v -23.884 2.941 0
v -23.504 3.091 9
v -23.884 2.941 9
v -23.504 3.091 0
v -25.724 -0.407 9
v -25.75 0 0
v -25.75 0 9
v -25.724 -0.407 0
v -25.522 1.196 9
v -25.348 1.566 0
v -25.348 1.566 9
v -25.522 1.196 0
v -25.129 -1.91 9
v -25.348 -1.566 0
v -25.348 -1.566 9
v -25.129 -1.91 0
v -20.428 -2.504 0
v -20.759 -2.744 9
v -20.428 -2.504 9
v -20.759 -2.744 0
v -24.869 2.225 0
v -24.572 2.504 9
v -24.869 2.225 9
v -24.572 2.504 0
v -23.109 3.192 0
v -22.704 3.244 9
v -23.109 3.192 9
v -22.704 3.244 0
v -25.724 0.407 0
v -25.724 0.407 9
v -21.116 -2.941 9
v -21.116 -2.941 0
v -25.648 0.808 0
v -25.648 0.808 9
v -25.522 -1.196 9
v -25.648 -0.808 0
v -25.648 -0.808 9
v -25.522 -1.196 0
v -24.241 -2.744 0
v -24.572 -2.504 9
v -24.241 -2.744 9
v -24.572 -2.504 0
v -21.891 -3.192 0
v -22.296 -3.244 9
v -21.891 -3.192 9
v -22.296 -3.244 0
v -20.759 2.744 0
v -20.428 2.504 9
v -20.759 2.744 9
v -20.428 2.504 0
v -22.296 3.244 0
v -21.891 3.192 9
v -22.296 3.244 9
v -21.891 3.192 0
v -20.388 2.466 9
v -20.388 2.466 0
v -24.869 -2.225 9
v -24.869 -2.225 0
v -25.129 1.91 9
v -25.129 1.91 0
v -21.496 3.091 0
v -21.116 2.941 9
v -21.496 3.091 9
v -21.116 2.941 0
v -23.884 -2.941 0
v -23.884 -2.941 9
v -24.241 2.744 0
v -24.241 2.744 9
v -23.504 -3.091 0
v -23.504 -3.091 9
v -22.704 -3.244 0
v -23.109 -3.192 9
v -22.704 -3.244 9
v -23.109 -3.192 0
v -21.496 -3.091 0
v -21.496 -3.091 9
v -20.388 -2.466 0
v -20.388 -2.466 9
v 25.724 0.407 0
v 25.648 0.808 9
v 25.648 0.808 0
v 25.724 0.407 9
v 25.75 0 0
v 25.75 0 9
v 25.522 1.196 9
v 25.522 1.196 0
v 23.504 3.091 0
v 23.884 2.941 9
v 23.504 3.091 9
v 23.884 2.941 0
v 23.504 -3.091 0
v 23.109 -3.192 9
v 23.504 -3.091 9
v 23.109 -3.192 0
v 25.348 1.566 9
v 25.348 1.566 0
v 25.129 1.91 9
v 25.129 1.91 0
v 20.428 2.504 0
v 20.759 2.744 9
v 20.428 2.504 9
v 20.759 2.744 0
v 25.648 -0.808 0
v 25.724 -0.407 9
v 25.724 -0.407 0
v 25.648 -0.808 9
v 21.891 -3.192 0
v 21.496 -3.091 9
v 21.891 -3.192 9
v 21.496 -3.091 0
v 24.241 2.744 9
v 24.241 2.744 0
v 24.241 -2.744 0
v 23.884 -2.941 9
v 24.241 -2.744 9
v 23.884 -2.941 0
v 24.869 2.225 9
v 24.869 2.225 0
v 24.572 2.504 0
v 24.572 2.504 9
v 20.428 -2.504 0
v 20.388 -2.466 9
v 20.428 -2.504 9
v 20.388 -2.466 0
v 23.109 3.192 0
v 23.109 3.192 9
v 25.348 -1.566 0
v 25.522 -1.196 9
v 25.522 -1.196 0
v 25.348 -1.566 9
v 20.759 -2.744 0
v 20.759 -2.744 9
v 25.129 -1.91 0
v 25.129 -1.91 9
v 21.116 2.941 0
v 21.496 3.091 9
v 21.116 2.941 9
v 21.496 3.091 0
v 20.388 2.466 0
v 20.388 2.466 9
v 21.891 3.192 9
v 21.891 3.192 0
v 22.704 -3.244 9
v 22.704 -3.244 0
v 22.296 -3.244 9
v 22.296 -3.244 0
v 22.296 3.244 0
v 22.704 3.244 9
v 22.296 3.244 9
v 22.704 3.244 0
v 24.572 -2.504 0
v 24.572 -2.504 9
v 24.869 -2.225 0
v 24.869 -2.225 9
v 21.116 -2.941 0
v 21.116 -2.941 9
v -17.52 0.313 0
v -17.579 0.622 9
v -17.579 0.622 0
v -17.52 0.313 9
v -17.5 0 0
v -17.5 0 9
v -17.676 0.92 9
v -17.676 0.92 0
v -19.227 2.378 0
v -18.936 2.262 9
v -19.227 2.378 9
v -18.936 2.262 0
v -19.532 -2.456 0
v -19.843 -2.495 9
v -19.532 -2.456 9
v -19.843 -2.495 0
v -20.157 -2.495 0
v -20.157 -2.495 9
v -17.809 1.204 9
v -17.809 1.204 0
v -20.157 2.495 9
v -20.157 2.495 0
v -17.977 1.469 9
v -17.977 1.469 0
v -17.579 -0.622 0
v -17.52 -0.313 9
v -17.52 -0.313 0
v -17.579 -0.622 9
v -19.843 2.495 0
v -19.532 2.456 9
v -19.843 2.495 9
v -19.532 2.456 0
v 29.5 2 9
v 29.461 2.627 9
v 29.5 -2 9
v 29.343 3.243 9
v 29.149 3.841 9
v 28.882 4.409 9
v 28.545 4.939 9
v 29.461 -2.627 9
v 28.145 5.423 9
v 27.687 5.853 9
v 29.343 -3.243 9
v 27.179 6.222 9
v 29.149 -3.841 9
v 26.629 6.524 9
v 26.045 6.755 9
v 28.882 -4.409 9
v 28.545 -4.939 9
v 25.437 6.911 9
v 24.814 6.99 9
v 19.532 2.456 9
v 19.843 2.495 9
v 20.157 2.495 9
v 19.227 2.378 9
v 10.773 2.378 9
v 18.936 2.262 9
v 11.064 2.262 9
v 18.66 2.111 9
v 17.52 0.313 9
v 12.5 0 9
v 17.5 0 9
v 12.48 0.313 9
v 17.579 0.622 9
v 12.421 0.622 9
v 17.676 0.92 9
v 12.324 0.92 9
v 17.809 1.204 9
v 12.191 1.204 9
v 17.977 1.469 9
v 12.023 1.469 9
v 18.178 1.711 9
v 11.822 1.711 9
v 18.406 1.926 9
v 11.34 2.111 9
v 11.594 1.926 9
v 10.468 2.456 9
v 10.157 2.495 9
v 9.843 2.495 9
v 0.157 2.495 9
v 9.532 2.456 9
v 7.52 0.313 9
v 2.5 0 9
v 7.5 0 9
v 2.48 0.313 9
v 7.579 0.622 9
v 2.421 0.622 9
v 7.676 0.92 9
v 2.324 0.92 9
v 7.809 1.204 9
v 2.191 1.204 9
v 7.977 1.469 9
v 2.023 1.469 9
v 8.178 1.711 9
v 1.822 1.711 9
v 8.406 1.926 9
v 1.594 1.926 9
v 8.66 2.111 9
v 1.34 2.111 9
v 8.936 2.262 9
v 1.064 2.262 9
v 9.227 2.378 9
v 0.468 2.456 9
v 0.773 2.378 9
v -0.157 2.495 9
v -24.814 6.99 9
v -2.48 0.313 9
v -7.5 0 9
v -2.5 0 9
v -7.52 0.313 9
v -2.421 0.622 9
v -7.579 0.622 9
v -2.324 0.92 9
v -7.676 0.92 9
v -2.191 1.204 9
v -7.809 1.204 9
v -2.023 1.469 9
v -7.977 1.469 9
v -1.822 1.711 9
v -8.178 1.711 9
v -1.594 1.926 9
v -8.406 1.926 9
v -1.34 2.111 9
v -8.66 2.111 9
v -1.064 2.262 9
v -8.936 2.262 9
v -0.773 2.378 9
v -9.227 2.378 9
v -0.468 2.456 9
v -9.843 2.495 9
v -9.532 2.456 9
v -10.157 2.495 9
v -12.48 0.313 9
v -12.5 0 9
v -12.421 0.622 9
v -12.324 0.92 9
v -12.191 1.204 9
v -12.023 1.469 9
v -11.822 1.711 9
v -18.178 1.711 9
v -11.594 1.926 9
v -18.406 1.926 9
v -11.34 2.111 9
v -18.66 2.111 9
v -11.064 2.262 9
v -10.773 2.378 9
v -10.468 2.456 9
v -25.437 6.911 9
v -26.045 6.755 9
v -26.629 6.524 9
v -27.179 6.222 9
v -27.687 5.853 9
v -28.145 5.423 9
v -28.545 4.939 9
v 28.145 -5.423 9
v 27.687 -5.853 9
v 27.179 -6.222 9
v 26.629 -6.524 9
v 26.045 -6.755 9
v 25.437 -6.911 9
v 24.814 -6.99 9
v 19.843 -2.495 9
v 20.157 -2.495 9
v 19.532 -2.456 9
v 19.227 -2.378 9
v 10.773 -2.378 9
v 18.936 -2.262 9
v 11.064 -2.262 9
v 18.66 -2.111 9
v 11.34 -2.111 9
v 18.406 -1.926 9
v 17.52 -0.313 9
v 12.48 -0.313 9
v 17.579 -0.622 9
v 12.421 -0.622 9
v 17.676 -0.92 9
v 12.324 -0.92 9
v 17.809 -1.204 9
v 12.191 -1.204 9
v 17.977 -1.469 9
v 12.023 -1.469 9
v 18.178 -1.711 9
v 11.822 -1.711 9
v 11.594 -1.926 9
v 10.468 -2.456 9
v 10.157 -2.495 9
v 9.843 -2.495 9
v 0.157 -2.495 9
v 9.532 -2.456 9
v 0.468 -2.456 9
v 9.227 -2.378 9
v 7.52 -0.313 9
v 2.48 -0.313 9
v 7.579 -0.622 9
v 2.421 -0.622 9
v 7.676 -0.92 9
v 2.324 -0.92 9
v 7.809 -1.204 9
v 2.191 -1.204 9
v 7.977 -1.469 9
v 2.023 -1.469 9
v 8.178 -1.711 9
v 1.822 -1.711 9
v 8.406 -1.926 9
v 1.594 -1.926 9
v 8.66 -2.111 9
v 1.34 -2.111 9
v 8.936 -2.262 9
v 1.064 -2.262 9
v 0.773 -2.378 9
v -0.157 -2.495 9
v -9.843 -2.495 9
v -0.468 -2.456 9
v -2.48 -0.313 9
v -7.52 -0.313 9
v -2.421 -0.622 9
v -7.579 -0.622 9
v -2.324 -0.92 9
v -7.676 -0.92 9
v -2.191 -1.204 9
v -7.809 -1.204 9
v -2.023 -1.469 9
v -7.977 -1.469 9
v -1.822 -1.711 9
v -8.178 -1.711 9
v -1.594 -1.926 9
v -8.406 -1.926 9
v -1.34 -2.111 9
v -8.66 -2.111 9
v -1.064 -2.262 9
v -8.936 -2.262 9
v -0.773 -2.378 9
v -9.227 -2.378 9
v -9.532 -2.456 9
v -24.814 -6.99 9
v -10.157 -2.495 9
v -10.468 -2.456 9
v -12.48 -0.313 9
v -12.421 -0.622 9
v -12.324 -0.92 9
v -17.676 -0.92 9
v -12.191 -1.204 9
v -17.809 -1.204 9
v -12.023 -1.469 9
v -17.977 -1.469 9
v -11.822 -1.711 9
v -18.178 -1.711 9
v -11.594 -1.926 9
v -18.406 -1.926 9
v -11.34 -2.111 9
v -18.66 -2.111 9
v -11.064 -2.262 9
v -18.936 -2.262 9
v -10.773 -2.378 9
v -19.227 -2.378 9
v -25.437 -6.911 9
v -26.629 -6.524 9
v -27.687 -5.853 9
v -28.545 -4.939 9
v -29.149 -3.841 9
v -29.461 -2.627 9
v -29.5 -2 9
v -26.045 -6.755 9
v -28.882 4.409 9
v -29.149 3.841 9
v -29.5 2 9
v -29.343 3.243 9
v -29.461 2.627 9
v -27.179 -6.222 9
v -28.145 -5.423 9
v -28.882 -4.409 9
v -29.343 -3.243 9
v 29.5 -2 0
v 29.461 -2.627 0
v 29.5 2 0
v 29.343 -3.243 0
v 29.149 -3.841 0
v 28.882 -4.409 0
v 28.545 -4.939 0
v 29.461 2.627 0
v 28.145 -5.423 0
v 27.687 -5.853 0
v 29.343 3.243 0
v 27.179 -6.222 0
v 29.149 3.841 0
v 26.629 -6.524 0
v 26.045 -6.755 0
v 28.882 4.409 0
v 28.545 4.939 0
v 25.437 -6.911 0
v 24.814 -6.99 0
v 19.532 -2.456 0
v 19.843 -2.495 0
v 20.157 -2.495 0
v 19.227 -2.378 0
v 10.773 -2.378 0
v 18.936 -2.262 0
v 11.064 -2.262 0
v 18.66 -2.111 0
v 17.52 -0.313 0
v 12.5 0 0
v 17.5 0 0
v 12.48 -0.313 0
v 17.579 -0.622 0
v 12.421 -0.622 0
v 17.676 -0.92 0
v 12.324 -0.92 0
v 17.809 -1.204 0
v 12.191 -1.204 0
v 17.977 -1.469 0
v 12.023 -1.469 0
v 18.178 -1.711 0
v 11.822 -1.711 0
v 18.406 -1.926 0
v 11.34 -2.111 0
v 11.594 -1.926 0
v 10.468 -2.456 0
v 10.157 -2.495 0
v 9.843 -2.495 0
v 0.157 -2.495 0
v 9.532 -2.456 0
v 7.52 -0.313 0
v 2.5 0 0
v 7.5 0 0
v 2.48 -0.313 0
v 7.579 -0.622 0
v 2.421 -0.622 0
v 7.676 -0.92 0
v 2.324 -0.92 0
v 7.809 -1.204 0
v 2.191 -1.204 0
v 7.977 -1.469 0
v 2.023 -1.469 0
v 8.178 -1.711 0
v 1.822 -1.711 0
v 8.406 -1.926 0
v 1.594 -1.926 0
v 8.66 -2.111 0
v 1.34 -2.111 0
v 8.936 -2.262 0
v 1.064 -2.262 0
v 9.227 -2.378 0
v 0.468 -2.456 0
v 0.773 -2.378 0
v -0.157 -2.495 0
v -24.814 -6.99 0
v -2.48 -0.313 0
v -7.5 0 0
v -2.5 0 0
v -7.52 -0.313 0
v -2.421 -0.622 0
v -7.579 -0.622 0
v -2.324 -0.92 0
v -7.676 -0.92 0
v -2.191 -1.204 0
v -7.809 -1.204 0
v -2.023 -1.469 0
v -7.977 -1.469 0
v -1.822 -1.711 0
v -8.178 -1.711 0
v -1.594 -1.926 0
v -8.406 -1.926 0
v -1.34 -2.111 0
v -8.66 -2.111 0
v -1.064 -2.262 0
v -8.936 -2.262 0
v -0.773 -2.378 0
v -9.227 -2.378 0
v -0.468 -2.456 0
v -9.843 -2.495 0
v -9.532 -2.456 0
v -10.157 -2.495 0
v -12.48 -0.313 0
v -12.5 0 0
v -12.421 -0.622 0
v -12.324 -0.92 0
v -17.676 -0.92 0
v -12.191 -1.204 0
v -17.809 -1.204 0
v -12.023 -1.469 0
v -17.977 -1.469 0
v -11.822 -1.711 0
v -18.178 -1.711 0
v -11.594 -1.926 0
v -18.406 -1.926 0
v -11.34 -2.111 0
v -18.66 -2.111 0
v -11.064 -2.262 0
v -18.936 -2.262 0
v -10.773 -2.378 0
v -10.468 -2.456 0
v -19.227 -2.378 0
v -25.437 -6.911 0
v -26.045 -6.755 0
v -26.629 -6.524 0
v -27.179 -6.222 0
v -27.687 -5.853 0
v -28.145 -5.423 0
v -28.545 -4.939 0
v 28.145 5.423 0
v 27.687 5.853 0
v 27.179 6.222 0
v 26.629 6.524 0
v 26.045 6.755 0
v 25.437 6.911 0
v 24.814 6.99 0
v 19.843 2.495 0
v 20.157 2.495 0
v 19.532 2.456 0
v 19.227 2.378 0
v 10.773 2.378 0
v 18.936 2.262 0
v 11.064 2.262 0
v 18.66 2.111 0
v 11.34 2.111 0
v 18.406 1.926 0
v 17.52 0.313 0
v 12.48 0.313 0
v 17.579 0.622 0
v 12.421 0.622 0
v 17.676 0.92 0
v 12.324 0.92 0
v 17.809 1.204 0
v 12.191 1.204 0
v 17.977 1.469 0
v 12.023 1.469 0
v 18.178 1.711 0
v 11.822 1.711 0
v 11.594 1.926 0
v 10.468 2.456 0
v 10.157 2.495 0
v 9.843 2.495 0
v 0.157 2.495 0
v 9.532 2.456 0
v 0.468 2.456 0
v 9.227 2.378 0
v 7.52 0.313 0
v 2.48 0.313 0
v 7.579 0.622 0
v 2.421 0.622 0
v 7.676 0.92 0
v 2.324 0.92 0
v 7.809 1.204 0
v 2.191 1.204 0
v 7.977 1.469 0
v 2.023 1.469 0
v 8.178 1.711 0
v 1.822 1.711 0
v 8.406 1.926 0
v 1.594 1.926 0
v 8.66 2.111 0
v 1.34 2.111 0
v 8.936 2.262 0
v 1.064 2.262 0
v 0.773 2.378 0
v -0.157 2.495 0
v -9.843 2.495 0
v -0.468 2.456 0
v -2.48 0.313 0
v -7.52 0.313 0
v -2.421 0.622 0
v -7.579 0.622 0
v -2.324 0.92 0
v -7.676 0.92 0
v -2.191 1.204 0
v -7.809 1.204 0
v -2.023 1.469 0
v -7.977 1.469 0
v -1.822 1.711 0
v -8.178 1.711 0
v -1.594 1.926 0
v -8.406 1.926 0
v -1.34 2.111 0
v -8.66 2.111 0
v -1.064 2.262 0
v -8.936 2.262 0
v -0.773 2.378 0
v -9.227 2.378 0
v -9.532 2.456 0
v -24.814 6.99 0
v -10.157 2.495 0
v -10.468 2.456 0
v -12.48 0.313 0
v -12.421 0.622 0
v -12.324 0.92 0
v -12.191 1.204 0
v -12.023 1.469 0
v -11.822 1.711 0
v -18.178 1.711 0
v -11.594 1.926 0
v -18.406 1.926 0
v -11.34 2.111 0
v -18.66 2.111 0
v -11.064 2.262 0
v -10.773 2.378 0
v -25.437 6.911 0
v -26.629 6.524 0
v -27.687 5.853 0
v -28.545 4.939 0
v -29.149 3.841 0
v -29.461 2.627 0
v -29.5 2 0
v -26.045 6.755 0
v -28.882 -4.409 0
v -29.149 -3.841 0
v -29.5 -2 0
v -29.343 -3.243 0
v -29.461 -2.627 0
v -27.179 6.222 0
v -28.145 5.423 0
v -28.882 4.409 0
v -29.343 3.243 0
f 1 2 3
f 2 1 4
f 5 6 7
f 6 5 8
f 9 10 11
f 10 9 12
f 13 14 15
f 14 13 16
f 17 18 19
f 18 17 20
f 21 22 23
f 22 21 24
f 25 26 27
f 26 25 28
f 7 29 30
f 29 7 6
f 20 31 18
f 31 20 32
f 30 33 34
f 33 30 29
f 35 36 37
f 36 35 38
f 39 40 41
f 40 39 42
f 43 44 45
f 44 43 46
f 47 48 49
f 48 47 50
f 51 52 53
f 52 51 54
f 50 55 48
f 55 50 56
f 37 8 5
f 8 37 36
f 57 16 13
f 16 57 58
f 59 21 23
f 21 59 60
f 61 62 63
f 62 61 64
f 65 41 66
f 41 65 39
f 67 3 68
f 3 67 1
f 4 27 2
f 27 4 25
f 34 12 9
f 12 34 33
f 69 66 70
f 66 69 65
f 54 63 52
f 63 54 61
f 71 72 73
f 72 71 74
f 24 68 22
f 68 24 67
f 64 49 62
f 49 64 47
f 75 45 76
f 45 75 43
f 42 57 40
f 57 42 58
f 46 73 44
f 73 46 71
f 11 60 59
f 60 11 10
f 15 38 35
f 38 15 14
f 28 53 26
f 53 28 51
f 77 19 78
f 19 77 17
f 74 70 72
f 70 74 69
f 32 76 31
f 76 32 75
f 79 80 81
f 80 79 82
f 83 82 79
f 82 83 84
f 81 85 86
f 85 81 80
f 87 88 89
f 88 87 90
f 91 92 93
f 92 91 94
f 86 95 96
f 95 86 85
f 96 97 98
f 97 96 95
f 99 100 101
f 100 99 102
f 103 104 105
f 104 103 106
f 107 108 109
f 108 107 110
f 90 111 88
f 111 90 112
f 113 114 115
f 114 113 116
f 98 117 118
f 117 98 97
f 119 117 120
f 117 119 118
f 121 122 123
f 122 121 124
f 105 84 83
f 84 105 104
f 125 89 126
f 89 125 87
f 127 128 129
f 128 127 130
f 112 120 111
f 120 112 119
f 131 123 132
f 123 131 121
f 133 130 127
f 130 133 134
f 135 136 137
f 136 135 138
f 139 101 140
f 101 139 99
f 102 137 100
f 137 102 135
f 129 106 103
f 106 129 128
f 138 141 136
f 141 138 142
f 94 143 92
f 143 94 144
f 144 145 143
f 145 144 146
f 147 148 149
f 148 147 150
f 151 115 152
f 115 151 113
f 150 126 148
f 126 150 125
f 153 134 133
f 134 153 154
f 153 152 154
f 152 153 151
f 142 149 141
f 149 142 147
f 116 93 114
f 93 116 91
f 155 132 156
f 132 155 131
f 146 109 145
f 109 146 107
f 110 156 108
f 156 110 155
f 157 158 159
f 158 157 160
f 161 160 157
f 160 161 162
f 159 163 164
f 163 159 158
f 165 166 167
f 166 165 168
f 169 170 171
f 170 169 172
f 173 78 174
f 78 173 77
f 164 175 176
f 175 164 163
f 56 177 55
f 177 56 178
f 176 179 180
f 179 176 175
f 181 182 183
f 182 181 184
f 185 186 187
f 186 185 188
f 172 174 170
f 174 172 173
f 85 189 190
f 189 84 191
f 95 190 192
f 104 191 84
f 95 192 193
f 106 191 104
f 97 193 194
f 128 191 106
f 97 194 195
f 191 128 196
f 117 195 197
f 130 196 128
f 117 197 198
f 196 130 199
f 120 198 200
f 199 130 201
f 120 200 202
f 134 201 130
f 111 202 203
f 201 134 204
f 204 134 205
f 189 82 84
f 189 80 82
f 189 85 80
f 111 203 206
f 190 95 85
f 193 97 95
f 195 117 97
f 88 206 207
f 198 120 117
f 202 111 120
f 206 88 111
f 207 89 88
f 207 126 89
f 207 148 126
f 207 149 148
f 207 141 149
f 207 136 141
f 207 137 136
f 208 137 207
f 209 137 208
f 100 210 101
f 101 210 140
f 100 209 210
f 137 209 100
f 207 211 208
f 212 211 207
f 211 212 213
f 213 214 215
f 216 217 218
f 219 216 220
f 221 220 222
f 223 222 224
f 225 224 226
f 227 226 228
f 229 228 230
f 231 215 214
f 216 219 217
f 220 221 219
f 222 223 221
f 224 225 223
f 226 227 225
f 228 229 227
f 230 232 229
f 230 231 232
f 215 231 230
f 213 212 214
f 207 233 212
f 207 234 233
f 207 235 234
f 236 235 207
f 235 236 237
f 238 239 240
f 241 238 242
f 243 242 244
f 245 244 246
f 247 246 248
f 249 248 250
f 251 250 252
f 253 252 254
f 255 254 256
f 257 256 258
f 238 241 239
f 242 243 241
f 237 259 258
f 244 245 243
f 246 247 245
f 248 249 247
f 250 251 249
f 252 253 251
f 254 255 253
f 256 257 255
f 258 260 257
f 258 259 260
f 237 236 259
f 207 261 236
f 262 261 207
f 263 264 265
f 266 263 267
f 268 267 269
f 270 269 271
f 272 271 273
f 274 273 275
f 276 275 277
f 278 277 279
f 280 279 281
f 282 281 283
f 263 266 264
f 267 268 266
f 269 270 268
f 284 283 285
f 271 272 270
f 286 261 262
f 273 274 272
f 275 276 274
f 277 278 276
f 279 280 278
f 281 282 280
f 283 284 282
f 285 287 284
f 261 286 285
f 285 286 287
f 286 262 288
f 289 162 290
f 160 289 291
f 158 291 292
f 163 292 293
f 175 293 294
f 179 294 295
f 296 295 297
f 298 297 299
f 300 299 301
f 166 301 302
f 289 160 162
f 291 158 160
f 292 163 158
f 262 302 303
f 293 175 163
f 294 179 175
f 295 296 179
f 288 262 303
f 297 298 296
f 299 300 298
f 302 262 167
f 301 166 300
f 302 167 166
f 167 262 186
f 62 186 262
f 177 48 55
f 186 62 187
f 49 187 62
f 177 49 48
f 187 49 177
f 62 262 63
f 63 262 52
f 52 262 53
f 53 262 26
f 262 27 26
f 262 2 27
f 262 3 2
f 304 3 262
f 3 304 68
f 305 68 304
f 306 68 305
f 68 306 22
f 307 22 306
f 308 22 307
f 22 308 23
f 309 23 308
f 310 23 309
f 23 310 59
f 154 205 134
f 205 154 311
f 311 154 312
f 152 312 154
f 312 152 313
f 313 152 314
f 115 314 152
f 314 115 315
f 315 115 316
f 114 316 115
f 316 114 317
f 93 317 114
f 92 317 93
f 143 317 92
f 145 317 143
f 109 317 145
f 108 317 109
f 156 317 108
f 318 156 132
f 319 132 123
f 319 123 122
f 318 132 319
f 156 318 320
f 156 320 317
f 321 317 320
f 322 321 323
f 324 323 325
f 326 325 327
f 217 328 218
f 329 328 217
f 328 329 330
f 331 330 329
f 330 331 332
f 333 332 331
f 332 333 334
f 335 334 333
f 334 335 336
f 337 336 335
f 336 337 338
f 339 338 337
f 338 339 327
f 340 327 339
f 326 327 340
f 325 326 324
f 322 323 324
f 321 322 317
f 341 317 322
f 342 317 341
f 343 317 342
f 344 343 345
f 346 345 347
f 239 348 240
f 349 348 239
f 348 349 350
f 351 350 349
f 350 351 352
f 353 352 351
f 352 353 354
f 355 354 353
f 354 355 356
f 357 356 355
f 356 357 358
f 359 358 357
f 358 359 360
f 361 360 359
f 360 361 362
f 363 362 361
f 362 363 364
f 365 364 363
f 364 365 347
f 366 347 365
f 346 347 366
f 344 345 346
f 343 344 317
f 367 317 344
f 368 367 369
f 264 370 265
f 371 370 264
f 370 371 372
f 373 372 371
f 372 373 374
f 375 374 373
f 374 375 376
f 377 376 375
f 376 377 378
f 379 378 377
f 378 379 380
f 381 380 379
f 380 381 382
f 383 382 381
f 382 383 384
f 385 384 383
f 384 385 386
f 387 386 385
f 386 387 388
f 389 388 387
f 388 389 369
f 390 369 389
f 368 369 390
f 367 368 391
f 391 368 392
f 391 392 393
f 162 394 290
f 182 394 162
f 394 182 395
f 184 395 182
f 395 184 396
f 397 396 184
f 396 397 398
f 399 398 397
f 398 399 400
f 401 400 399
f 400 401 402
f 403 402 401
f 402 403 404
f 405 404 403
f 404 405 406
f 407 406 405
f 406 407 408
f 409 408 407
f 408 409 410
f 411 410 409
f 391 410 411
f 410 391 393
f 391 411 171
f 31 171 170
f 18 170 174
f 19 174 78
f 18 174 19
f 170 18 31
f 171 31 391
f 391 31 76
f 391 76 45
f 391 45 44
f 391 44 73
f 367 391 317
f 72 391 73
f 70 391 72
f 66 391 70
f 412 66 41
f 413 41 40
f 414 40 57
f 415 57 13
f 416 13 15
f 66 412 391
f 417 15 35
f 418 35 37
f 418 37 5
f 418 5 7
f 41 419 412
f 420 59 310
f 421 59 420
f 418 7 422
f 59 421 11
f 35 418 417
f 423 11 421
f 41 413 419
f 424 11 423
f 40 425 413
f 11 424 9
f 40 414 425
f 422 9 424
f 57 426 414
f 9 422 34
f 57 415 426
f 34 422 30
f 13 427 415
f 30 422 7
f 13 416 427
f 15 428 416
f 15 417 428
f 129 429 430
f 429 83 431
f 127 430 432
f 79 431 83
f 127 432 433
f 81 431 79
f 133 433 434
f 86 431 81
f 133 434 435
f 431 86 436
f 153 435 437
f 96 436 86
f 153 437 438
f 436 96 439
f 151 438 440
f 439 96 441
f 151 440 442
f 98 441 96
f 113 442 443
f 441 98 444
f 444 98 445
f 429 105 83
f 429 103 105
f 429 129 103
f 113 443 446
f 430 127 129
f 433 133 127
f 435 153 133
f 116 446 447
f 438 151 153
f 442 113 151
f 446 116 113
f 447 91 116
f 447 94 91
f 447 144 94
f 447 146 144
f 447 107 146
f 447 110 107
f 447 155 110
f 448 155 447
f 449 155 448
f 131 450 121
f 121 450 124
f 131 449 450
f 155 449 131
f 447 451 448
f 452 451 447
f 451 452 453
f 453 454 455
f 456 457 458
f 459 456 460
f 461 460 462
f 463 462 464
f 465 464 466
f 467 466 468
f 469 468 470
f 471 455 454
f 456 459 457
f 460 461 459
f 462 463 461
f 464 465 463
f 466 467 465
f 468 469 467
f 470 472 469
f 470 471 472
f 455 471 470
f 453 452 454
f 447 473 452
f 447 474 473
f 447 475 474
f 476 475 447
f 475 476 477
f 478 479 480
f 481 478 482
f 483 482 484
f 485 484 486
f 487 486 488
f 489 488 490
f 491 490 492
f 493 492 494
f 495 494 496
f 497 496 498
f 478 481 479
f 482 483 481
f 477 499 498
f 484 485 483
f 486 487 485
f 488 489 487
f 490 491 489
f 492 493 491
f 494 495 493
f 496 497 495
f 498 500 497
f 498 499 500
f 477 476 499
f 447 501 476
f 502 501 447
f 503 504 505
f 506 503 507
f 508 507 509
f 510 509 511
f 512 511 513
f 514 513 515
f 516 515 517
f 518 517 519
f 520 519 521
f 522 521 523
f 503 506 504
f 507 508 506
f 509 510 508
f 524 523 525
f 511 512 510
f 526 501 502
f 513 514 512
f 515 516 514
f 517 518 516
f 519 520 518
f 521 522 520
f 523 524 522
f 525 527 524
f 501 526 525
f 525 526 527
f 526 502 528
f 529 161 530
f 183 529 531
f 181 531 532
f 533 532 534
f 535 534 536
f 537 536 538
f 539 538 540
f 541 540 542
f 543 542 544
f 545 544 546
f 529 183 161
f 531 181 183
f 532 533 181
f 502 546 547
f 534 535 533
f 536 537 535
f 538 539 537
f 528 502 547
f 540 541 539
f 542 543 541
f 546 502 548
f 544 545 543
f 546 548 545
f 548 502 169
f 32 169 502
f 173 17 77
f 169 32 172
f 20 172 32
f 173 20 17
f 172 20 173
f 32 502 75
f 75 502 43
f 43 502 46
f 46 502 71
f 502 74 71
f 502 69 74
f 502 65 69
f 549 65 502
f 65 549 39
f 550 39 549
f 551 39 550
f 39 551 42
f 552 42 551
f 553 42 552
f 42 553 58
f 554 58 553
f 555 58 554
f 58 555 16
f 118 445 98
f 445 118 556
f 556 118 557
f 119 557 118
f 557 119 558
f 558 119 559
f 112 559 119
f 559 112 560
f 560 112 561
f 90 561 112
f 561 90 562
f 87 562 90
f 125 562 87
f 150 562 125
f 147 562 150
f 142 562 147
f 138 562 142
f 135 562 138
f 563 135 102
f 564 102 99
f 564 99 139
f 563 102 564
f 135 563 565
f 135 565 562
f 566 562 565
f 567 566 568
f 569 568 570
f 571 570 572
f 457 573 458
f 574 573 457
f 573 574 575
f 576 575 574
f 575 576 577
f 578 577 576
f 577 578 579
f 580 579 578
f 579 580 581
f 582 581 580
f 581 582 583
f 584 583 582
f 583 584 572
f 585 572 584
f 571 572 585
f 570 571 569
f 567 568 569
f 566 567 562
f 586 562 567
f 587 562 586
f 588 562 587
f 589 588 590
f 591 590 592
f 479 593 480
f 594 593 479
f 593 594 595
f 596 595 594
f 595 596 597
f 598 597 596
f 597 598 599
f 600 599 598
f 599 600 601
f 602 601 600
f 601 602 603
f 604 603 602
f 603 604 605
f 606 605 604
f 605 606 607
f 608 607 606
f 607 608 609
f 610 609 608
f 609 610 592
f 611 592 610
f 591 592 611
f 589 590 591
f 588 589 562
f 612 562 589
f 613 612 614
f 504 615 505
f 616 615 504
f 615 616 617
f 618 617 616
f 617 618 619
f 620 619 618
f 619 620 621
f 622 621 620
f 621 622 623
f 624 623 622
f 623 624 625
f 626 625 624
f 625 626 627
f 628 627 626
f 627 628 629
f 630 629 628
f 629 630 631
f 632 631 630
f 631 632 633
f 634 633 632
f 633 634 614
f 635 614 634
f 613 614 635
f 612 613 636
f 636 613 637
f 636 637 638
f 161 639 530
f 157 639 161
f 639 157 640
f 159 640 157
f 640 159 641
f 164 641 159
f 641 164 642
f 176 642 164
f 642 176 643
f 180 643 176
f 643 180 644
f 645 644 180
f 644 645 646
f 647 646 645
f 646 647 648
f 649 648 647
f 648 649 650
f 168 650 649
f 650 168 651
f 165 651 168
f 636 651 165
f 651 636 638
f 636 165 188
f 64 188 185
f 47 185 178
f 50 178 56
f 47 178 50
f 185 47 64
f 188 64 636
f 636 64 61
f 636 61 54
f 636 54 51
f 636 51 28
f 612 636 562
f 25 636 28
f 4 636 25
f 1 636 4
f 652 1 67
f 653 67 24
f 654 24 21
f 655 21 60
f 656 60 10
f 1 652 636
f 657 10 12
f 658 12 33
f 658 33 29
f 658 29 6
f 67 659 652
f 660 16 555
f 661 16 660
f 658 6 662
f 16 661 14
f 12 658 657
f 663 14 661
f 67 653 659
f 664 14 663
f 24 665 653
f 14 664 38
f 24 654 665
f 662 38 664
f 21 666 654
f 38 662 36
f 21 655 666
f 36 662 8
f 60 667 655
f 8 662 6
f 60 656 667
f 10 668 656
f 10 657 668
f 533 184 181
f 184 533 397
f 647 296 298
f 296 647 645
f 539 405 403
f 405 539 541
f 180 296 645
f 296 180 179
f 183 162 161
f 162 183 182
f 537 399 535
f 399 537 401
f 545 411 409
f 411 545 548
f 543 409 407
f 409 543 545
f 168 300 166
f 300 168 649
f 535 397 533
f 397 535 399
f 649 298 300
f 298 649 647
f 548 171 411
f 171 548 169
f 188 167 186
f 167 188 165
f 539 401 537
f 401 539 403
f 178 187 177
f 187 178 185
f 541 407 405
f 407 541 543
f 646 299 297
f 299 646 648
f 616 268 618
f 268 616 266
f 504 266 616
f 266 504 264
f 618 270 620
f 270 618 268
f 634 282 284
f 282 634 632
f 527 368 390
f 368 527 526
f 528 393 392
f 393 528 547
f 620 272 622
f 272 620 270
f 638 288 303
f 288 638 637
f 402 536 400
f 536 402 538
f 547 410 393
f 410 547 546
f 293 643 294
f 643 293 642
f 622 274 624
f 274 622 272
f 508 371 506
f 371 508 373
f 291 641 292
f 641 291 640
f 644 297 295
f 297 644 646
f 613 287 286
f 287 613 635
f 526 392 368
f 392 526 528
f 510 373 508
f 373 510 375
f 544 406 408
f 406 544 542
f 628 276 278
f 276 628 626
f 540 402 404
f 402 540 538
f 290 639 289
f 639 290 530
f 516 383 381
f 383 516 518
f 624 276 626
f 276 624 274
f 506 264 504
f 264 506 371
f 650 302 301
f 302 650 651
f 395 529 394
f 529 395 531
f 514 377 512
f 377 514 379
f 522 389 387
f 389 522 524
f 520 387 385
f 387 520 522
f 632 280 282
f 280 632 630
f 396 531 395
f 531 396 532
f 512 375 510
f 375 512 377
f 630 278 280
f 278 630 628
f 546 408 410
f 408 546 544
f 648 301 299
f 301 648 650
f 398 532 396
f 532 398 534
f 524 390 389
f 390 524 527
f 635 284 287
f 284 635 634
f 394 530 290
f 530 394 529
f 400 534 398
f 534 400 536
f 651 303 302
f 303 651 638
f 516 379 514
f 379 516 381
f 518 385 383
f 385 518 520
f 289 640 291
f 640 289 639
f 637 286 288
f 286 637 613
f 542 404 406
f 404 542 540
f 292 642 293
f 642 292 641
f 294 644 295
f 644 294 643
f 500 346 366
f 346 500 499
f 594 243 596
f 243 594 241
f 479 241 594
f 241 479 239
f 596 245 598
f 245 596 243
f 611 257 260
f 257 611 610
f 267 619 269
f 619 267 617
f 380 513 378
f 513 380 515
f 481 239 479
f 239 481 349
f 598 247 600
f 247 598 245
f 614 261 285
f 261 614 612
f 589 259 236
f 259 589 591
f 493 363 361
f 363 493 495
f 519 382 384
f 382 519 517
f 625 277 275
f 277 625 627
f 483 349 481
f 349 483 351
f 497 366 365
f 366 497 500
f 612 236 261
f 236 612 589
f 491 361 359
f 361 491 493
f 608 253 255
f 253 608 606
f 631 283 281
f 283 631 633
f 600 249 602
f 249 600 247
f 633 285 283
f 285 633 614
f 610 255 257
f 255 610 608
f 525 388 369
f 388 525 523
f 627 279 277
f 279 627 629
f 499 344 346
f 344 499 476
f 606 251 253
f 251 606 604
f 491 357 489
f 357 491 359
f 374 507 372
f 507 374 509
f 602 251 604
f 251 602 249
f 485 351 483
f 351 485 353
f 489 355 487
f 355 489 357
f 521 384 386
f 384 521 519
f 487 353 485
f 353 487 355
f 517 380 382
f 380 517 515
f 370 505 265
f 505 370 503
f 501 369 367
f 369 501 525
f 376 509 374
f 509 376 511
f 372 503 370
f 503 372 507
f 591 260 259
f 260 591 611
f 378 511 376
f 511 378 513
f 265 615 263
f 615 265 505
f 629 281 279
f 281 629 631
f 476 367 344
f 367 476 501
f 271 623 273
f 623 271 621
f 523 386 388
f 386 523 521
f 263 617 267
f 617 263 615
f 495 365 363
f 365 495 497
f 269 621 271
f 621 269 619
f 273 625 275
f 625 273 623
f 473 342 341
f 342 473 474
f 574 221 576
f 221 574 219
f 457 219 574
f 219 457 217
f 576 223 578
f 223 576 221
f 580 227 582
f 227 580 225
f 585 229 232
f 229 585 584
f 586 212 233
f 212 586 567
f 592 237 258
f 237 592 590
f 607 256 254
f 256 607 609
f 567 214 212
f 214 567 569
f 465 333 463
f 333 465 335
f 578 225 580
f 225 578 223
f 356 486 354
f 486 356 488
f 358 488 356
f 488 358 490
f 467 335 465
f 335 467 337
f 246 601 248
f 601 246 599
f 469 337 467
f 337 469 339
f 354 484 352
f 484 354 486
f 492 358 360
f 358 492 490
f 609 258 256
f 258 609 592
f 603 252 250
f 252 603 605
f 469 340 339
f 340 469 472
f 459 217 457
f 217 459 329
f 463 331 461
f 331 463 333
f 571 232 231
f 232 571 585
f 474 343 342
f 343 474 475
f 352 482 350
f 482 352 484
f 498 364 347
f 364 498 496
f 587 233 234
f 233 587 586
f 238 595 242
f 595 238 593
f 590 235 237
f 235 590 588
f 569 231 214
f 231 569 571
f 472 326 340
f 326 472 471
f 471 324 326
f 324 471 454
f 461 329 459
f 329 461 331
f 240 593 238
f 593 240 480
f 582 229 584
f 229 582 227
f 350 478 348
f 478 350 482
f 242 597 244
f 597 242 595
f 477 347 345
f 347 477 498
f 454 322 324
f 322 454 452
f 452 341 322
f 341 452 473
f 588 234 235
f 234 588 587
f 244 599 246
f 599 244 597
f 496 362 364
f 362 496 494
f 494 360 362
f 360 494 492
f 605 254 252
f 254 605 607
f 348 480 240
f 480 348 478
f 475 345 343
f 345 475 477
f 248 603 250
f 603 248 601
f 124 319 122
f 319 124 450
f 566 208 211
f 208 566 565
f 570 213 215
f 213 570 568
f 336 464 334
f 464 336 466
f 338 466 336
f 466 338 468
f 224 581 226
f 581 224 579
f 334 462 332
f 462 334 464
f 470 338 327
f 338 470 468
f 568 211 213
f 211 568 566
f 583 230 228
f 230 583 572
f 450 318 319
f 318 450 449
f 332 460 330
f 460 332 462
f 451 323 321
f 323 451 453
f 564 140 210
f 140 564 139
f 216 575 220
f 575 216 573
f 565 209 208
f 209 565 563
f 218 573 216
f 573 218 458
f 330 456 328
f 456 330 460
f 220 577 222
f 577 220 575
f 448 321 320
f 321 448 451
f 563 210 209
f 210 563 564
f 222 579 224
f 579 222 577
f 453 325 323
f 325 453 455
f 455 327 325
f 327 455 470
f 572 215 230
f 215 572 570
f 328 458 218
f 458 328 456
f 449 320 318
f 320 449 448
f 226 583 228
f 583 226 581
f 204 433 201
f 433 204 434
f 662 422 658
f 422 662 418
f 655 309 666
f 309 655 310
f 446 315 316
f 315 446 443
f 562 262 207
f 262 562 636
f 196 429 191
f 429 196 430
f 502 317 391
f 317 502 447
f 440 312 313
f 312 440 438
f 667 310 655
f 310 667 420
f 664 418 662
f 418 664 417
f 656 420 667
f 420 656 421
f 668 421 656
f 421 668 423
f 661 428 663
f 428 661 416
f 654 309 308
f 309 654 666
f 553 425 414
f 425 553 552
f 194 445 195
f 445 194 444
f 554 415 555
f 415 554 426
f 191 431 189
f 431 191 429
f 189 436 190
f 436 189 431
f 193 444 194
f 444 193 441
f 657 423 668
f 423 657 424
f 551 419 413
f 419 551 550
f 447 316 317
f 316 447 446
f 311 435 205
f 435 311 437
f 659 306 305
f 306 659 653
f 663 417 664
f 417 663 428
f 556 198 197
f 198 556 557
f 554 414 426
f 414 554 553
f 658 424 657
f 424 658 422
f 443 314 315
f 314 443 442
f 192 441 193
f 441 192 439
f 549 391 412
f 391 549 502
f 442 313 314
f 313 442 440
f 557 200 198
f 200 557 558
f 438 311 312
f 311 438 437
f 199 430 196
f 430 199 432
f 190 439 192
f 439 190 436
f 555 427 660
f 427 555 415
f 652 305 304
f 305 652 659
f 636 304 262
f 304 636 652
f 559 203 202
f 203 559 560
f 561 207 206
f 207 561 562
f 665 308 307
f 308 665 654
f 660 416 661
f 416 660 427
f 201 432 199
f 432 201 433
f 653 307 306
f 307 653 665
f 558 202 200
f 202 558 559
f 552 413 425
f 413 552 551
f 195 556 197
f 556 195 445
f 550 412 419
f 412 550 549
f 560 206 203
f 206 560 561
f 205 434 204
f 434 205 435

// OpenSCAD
$fn = 50;


difference() {
	union() {
		hull() {
			translate(v = [-24.5000000000, 2.0000000000, 0]) {
				cylinder(h = 9, r = 5);
			}
			translate(v = [24.5000000000, 2.0000000000, 0]) {
				cylinder(h = 9, r = 5);
			}
			translate(v = [-24.5000000000, -2.0000000000, 0]) {
				cylinder(h = 9, r = 5);
			}
			translate(v = [24.5000000000, -2.0000000000, 0]) {
				cylinder(h = 9, r = 5);
			}
		}
	}
	union() {
		#translate(v = [-22.5000000000, 0.0000000000, -100.0000000000]) {
			cylinder(h = 200, r = 3.2500000000);
		}
		#translate(v = [-22.5000000000, 0.0000000000, -100.0000000000]) {
			cylinder(h = 200, r = 3.2500000000);
		}
		#translate(v = [22.5000000000, 0.0000000000, -100.0000000000]) {
			cylinder(h = 200, r = 3.2500000000);
		}
		#translate(v = [22.5000000000, 0.0000000000, -100.0000000000]) {
			cylinder(h = 200, r = 3.2500000000);
		}
		#translate(v = [-20.0000000000, 0, 0]) {
			cylinder(h = 9, r = 2.5000000000);
		}
		#translate(v = [-10.0000000000, 0, 0]) {
			cylinder(h = 9, r = 2.5000000000);
		}
		#cylinder(h = 9, r = 2.5000000000);
		#translate(v = [10.0000000000, 0, 0]) {
			cylinder(h = 9, r = 2.5000000000);
		}
		#translate(v = [20.0000000000, 0, 0]) {
			cylinder(h = 9, r = 2.5000000000);
		}
	}
}
